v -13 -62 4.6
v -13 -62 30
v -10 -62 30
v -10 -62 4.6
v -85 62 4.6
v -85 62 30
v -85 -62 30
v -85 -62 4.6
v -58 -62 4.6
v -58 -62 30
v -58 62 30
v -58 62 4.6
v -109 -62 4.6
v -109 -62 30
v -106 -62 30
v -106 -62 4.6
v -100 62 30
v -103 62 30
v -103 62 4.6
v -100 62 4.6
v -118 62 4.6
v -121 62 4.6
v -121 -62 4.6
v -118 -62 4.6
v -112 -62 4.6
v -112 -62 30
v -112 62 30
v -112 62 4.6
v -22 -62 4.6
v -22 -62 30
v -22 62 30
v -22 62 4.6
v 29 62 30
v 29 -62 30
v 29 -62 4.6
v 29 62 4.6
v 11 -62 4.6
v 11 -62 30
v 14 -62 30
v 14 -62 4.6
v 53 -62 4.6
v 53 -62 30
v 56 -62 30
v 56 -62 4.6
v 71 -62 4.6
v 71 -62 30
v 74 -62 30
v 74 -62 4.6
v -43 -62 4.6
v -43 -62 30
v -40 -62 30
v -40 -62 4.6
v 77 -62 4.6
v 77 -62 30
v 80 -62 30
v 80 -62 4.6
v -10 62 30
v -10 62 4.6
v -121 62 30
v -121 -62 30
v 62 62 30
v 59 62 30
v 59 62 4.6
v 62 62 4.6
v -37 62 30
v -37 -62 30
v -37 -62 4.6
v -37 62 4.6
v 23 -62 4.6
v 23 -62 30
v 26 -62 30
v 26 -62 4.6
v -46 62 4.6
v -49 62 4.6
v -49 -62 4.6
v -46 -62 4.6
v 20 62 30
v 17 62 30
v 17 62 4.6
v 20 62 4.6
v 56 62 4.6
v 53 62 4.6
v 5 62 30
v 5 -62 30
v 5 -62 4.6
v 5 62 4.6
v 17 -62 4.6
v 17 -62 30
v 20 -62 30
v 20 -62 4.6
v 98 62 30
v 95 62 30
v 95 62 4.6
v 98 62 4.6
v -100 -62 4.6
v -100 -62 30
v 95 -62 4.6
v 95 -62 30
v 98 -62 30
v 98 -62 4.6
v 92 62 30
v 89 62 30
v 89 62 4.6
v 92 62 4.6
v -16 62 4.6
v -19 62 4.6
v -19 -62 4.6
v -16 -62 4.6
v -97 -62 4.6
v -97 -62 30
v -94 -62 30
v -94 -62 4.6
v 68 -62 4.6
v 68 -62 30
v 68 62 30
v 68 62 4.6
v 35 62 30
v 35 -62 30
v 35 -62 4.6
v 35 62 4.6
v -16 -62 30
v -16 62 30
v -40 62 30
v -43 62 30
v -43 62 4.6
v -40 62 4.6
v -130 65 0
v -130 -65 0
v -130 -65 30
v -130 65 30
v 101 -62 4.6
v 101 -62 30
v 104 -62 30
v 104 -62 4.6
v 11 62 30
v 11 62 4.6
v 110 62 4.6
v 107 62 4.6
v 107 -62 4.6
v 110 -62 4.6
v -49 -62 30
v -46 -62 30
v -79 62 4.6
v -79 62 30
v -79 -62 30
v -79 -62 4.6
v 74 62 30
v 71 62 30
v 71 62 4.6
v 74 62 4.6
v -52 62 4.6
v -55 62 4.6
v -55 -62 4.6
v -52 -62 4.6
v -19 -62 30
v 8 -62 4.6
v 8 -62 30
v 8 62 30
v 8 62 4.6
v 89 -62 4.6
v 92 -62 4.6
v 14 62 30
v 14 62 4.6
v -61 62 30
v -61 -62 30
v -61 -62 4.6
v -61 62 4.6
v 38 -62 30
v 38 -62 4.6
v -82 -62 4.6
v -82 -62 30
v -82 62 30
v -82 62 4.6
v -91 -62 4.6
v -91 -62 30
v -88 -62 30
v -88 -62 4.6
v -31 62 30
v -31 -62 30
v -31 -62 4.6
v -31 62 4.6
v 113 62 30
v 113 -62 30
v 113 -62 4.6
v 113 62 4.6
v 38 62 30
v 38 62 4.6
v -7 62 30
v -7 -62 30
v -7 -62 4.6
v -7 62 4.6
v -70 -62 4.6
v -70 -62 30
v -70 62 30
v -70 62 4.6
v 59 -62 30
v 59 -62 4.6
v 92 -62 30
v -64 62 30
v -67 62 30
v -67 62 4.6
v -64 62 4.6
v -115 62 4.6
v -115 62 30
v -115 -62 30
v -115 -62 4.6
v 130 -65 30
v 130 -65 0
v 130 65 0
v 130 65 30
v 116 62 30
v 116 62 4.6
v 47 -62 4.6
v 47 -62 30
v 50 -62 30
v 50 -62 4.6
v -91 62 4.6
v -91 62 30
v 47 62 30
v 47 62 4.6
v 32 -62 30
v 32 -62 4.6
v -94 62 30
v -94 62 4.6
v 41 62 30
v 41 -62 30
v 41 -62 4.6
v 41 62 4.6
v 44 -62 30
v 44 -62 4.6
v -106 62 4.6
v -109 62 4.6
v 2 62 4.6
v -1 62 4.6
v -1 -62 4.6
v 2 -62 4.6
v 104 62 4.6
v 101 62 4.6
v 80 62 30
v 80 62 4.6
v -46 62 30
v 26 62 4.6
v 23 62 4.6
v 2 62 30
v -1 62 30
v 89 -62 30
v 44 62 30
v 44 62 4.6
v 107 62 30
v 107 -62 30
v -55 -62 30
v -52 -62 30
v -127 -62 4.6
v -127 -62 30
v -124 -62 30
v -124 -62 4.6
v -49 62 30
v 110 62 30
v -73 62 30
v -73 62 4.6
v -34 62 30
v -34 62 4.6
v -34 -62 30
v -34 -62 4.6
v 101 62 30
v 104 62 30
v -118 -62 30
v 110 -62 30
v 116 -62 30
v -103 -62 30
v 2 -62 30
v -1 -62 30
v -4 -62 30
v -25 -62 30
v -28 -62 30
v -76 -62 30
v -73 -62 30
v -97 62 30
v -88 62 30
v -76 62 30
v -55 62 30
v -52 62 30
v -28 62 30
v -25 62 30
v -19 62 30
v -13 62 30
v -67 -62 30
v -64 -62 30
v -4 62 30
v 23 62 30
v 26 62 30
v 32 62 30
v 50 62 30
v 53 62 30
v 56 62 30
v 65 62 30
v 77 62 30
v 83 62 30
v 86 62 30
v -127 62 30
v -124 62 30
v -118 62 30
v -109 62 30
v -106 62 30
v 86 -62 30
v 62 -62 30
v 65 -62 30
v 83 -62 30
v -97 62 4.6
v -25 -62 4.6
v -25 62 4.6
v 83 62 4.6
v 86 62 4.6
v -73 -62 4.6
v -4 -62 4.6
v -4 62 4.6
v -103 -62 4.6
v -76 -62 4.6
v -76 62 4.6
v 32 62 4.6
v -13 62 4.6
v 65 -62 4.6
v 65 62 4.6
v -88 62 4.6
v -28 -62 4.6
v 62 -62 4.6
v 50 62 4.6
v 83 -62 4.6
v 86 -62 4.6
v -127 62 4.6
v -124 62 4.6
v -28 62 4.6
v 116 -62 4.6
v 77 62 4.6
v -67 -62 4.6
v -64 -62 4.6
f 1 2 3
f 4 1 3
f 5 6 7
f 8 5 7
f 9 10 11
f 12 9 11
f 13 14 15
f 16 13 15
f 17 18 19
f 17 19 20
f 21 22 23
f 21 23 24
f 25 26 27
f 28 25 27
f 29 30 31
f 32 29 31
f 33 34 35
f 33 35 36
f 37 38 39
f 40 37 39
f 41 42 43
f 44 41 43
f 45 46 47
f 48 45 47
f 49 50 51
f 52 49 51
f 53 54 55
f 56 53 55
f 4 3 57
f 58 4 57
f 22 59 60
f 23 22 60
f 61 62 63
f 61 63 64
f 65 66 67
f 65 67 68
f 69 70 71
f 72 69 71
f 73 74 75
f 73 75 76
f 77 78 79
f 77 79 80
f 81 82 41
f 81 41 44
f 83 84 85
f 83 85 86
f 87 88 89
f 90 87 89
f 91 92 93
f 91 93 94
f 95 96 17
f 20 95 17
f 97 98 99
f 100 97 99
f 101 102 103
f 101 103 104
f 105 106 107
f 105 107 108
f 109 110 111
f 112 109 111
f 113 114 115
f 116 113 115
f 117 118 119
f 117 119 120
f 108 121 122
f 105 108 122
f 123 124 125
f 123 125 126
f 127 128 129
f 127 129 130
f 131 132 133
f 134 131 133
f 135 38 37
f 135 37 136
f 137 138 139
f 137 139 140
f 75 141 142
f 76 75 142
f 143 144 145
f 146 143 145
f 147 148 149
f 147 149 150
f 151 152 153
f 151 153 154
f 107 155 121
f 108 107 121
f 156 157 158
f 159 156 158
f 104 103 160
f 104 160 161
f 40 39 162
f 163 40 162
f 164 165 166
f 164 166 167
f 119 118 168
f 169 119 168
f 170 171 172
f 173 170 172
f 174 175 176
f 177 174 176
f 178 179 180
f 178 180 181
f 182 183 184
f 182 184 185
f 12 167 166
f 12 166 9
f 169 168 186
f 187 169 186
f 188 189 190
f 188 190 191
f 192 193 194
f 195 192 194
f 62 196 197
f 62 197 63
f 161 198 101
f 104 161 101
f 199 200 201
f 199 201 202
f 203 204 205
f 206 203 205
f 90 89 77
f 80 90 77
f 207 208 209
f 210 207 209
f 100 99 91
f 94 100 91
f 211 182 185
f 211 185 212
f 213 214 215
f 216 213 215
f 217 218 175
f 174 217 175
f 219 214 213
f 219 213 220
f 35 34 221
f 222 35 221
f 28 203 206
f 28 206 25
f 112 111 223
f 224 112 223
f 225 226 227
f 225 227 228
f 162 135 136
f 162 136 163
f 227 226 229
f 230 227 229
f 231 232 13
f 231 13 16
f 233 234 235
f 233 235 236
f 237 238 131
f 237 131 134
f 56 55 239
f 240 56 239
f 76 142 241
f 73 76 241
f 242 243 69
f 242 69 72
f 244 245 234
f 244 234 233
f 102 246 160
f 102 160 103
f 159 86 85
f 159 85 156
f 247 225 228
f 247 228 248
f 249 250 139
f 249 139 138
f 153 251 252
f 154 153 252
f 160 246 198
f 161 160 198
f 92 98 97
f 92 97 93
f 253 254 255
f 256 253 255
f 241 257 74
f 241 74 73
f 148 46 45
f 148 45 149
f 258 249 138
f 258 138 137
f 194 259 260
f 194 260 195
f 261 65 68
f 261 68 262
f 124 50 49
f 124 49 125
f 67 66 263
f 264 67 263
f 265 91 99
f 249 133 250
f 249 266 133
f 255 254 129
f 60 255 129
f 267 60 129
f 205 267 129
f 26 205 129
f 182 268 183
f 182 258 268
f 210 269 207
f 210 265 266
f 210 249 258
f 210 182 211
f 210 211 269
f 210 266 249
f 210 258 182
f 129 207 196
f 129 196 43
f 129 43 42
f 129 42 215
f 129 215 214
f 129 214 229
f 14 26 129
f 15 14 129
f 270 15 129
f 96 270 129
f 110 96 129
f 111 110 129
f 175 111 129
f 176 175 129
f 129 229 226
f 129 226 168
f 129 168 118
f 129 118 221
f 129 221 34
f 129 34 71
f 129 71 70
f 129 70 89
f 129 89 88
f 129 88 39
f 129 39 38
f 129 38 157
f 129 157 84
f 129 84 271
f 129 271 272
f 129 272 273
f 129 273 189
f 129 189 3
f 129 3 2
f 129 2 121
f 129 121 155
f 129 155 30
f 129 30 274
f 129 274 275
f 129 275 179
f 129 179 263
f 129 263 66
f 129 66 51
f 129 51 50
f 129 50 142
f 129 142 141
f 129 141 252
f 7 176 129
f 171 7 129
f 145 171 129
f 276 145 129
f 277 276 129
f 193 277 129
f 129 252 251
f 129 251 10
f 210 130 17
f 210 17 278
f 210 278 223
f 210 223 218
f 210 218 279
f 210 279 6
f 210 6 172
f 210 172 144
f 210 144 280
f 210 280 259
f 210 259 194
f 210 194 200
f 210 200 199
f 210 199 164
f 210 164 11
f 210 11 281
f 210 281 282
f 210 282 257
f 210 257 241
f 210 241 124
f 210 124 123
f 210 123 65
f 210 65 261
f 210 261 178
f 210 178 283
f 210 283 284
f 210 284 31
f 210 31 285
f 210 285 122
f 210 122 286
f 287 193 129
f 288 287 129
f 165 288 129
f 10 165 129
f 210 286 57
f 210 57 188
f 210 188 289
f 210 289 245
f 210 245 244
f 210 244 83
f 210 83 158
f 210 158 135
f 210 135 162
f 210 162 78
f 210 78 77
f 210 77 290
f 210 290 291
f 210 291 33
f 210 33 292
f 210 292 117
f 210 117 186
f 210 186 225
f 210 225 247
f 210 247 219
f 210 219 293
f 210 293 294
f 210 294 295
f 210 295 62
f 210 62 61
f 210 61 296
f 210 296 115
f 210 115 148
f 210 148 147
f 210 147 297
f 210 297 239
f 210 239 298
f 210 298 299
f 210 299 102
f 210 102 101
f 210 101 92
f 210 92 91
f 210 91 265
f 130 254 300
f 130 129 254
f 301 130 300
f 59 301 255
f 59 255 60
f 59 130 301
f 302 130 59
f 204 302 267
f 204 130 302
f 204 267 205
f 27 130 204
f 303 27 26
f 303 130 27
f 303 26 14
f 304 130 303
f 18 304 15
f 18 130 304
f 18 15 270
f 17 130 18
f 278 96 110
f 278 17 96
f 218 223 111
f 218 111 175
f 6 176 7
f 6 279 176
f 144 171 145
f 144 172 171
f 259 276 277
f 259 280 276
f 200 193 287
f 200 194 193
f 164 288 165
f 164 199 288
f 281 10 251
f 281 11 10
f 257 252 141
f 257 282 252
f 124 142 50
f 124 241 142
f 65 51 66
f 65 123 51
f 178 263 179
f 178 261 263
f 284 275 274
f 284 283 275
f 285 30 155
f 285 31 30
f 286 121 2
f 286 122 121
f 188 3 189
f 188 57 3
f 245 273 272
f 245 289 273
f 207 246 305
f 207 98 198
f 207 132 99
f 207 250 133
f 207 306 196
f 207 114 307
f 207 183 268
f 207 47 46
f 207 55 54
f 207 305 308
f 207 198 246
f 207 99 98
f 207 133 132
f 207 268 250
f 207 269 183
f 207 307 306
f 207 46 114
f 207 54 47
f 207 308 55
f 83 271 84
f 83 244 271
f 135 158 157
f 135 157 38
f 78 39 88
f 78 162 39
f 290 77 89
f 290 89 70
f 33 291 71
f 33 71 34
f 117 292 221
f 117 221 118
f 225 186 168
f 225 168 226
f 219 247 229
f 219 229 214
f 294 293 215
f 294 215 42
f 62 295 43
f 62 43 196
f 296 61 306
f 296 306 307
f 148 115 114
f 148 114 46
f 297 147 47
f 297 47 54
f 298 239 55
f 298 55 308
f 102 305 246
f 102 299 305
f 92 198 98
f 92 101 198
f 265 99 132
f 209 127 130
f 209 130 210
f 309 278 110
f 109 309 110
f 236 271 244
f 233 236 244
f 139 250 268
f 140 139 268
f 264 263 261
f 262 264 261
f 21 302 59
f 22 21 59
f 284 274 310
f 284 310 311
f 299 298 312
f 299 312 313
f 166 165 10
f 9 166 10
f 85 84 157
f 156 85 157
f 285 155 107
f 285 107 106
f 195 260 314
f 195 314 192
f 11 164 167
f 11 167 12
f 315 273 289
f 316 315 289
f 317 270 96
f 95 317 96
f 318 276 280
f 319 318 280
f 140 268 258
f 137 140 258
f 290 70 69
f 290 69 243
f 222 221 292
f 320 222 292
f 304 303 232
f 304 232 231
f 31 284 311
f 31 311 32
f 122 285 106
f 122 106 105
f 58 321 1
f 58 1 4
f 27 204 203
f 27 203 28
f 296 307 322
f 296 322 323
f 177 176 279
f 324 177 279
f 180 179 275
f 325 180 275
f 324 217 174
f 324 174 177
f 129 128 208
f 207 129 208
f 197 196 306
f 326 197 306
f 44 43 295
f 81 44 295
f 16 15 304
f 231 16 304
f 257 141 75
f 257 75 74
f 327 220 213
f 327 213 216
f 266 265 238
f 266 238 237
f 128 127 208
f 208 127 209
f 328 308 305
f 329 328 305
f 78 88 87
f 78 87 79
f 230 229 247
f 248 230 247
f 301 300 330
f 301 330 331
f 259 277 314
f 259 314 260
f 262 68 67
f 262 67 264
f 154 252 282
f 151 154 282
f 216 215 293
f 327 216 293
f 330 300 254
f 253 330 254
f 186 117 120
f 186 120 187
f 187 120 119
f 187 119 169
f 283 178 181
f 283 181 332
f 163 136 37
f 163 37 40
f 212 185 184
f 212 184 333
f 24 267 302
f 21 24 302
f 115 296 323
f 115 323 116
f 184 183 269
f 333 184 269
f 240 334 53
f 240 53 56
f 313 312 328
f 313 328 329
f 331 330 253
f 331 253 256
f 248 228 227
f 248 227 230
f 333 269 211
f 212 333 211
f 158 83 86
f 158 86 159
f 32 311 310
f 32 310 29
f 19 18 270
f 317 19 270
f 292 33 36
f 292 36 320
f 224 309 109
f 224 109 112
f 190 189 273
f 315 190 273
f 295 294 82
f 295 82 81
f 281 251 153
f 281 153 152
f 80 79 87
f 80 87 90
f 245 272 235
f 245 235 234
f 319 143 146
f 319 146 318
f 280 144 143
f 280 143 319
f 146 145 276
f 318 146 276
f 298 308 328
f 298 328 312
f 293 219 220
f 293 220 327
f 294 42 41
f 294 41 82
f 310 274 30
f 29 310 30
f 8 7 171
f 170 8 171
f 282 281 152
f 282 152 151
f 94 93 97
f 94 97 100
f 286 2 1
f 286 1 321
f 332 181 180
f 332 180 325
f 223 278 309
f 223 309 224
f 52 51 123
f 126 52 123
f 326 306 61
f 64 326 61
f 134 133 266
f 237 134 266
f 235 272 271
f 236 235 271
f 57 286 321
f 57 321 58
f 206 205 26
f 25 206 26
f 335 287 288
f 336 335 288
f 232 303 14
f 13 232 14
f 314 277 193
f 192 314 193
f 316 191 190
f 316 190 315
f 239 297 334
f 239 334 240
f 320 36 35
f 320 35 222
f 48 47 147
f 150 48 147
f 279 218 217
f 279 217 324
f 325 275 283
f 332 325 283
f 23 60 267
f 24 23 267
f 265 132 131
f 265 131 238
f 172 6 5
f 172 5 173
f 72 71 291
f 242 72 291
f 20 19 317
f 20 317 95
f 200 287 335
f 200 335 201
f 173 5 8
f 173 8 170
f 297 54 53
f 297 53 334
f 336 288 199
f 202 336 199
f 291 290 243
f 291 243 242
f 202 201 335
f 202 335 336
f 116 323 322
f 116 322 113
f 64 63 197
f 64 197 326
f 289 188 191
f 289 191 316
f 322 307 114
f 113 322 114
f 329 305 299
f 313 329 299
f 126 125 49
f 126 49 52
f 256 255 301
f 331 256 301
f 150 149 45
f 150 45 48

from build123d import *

# Parameters (mm, degrees)
F0_W     = 260
F0_H     = 130
F1_DEPTH = 30
F2_W     = 3
F2_H     = 62
F2_H_2   = 124
F3_DEPTH = 25.4


with BuildPart() as f1:
    # F0 (on Top) → F1 (new body)
    with BuildSketch(Plane.XY):
        Rectangle(F0_W, F0_H)
    extrude(amount=F1_DEPTH)

    # F2 (on face) → F3 (cut)
    with BuildSketch(Plane.XY.offset(30)):
        with Locations((-125.5, 31)):
            Rectangle(F2_W, F2_H)
        with Locations((-125.5, -31)):
            Rectangle(F2_W, F2_H)
        Polygon((-118, 62), (-121, 62), (-121, 4.026381), (-121, 0), (-118, 0), align=None)
        with Locations((-119.5, -31)):
            Rectangle(F2_W, F2_H)
        with Locations((-113.5, 31)):
            Rectangle(F2_W, F2_H)
        with Locations((-113.5, -31)):
            Rectangle(F2_W, F2_H)
        with Locations((-107.5, 31)):
            Rectangle(F2_W, F2_H)
        with Locations((-107.5, -31)):
            Rectangle(F2_W, F2_H)
        with Locations((-101.5, 31)):
            Rectangle(F2_W, F2_H)
        with Locations((-101.5, -31)):
            Rectangle(F2_W, F2_H)
        with Locations((-95.5, 31)):
            Rectangle(F2_W, F2_H)
        with Locations((-95.5, -31)):
            Rectangle(F2_W, F2_H)
        with Locations((-89.5, 31)):
            Rectangle(F2_W, F2_H)
        with Locations((-89.5, -31)):
            Rectangle(F2_W, F2_H)
        with Locations((-83.5, 31)):
            Rectangle(F2_W, F2_H)
        with Locations((-83.5, -31)):
            Rectangle(F2_W, F2_H)
        with Locations((-77.5, 31)):
            Rectangle(F2_W, F2_H)
        with Locations((-77.5, -31)):
            Rectangle(F2_W, F2_H)
        with Locations((-71.5, 0)):
            Rectangle(F2_W, F2_H_2)
        with Locations((-65.5, 0)):
            Rectangle(F2_W, F2_H_2)
        with Locations((-59.5, 0)):
            Rectangle(F2_W, F2_H_2)
        with Locations((-53.5, 0)):
            Rectangle(F2_W, F2_H_2)
        with Locations((-47.5, 0)):
            Rectangle(F2_W, F2_H_2)
        with Locations((-41.5, 0)):
            Rectangle(F2_W, F2_H_2)
        with Locations((-35.5, 0)):
            Rectangle(F2_W, F2_H_2)
        with Locations((-29.5, 0)):
            Rectangle(F2_W, F2_H_2)
        with Locations((-23.5, 0)):
            Rectangle(F2_W, F2_H_2)
        with Locations((-17.5, 0)):
            Rectangle(F2_W, F2_H_2)
        with Locations((-11.5, 0)):
            Rectangle(F2_W, F2_H_2)
        with Locations((-5.5, 0)):
            Rectangle(F2_W, F2_H_2)
        with Locations((0.5, 0)):
            Rectangle(F2_W, F2_H_2)
        with Locations((6.5, 0)):
            Rectangle(F2_W, F2_H_2)
        with Locations((12.5, 0)):
            Rectangle(F2_W, F2_H_2)
        with Locations((18.5, 0)):
            Rectangle(F2_W, F2_H_2)
        with Locations((24.5, 0)):
            Rectangle(F2_W, F2_H_2)
        with Locations((30.5, 0)):
            Rectangle(F2_W, F2_H_2)
        with Locations((36.5, 0)):
            Rectangle(F2_W, F2_H_2)
        with Locations((42.5, 0)):
            Rectangle(F2_W, F2_H_2)
        with Locations((48.5, 0)):
            Rectangle(F2_W, F2_H_2)
        with Locations((54.5, 0)):
            Rectangle(F2_W, F2_H_2)
        with Locations((60.5, 0)):
            Rectangle(F2_W, F2_H_2)
        with Locations((66.5, 0)):
            Rectangle(F2_W, F2_H_2)
        with Locations((72.5, 0)):
            Rectangle(F2_W, F2_H_2)
        with Locations((78.5, 0)):
            Rectangle(F2_W, F2_H_2)
        with Locations((84.5, 0)):
            Rectangle(F2_W, F2_H_2)
        with Locations((90.5, 0)):
            Rectangle(F2_W, F2_H_2)
        with Locations((96.5, 0)):
            Rectangle(F2_W, F2_H_2)
        with Locations((102.5, 0)):
            Rectangle(F2_W, F2_H_2)
        with Locations((108.5, 0)):
            Rectangle(F2_W, F2_H_2)
        with Locations((114.5, 0)):
            Rectangle(F2_W, F2_H_2)
    extrude(amount=-F3_DEPTH, mode=Mode.SUBTRACT)


solid = f1.part
